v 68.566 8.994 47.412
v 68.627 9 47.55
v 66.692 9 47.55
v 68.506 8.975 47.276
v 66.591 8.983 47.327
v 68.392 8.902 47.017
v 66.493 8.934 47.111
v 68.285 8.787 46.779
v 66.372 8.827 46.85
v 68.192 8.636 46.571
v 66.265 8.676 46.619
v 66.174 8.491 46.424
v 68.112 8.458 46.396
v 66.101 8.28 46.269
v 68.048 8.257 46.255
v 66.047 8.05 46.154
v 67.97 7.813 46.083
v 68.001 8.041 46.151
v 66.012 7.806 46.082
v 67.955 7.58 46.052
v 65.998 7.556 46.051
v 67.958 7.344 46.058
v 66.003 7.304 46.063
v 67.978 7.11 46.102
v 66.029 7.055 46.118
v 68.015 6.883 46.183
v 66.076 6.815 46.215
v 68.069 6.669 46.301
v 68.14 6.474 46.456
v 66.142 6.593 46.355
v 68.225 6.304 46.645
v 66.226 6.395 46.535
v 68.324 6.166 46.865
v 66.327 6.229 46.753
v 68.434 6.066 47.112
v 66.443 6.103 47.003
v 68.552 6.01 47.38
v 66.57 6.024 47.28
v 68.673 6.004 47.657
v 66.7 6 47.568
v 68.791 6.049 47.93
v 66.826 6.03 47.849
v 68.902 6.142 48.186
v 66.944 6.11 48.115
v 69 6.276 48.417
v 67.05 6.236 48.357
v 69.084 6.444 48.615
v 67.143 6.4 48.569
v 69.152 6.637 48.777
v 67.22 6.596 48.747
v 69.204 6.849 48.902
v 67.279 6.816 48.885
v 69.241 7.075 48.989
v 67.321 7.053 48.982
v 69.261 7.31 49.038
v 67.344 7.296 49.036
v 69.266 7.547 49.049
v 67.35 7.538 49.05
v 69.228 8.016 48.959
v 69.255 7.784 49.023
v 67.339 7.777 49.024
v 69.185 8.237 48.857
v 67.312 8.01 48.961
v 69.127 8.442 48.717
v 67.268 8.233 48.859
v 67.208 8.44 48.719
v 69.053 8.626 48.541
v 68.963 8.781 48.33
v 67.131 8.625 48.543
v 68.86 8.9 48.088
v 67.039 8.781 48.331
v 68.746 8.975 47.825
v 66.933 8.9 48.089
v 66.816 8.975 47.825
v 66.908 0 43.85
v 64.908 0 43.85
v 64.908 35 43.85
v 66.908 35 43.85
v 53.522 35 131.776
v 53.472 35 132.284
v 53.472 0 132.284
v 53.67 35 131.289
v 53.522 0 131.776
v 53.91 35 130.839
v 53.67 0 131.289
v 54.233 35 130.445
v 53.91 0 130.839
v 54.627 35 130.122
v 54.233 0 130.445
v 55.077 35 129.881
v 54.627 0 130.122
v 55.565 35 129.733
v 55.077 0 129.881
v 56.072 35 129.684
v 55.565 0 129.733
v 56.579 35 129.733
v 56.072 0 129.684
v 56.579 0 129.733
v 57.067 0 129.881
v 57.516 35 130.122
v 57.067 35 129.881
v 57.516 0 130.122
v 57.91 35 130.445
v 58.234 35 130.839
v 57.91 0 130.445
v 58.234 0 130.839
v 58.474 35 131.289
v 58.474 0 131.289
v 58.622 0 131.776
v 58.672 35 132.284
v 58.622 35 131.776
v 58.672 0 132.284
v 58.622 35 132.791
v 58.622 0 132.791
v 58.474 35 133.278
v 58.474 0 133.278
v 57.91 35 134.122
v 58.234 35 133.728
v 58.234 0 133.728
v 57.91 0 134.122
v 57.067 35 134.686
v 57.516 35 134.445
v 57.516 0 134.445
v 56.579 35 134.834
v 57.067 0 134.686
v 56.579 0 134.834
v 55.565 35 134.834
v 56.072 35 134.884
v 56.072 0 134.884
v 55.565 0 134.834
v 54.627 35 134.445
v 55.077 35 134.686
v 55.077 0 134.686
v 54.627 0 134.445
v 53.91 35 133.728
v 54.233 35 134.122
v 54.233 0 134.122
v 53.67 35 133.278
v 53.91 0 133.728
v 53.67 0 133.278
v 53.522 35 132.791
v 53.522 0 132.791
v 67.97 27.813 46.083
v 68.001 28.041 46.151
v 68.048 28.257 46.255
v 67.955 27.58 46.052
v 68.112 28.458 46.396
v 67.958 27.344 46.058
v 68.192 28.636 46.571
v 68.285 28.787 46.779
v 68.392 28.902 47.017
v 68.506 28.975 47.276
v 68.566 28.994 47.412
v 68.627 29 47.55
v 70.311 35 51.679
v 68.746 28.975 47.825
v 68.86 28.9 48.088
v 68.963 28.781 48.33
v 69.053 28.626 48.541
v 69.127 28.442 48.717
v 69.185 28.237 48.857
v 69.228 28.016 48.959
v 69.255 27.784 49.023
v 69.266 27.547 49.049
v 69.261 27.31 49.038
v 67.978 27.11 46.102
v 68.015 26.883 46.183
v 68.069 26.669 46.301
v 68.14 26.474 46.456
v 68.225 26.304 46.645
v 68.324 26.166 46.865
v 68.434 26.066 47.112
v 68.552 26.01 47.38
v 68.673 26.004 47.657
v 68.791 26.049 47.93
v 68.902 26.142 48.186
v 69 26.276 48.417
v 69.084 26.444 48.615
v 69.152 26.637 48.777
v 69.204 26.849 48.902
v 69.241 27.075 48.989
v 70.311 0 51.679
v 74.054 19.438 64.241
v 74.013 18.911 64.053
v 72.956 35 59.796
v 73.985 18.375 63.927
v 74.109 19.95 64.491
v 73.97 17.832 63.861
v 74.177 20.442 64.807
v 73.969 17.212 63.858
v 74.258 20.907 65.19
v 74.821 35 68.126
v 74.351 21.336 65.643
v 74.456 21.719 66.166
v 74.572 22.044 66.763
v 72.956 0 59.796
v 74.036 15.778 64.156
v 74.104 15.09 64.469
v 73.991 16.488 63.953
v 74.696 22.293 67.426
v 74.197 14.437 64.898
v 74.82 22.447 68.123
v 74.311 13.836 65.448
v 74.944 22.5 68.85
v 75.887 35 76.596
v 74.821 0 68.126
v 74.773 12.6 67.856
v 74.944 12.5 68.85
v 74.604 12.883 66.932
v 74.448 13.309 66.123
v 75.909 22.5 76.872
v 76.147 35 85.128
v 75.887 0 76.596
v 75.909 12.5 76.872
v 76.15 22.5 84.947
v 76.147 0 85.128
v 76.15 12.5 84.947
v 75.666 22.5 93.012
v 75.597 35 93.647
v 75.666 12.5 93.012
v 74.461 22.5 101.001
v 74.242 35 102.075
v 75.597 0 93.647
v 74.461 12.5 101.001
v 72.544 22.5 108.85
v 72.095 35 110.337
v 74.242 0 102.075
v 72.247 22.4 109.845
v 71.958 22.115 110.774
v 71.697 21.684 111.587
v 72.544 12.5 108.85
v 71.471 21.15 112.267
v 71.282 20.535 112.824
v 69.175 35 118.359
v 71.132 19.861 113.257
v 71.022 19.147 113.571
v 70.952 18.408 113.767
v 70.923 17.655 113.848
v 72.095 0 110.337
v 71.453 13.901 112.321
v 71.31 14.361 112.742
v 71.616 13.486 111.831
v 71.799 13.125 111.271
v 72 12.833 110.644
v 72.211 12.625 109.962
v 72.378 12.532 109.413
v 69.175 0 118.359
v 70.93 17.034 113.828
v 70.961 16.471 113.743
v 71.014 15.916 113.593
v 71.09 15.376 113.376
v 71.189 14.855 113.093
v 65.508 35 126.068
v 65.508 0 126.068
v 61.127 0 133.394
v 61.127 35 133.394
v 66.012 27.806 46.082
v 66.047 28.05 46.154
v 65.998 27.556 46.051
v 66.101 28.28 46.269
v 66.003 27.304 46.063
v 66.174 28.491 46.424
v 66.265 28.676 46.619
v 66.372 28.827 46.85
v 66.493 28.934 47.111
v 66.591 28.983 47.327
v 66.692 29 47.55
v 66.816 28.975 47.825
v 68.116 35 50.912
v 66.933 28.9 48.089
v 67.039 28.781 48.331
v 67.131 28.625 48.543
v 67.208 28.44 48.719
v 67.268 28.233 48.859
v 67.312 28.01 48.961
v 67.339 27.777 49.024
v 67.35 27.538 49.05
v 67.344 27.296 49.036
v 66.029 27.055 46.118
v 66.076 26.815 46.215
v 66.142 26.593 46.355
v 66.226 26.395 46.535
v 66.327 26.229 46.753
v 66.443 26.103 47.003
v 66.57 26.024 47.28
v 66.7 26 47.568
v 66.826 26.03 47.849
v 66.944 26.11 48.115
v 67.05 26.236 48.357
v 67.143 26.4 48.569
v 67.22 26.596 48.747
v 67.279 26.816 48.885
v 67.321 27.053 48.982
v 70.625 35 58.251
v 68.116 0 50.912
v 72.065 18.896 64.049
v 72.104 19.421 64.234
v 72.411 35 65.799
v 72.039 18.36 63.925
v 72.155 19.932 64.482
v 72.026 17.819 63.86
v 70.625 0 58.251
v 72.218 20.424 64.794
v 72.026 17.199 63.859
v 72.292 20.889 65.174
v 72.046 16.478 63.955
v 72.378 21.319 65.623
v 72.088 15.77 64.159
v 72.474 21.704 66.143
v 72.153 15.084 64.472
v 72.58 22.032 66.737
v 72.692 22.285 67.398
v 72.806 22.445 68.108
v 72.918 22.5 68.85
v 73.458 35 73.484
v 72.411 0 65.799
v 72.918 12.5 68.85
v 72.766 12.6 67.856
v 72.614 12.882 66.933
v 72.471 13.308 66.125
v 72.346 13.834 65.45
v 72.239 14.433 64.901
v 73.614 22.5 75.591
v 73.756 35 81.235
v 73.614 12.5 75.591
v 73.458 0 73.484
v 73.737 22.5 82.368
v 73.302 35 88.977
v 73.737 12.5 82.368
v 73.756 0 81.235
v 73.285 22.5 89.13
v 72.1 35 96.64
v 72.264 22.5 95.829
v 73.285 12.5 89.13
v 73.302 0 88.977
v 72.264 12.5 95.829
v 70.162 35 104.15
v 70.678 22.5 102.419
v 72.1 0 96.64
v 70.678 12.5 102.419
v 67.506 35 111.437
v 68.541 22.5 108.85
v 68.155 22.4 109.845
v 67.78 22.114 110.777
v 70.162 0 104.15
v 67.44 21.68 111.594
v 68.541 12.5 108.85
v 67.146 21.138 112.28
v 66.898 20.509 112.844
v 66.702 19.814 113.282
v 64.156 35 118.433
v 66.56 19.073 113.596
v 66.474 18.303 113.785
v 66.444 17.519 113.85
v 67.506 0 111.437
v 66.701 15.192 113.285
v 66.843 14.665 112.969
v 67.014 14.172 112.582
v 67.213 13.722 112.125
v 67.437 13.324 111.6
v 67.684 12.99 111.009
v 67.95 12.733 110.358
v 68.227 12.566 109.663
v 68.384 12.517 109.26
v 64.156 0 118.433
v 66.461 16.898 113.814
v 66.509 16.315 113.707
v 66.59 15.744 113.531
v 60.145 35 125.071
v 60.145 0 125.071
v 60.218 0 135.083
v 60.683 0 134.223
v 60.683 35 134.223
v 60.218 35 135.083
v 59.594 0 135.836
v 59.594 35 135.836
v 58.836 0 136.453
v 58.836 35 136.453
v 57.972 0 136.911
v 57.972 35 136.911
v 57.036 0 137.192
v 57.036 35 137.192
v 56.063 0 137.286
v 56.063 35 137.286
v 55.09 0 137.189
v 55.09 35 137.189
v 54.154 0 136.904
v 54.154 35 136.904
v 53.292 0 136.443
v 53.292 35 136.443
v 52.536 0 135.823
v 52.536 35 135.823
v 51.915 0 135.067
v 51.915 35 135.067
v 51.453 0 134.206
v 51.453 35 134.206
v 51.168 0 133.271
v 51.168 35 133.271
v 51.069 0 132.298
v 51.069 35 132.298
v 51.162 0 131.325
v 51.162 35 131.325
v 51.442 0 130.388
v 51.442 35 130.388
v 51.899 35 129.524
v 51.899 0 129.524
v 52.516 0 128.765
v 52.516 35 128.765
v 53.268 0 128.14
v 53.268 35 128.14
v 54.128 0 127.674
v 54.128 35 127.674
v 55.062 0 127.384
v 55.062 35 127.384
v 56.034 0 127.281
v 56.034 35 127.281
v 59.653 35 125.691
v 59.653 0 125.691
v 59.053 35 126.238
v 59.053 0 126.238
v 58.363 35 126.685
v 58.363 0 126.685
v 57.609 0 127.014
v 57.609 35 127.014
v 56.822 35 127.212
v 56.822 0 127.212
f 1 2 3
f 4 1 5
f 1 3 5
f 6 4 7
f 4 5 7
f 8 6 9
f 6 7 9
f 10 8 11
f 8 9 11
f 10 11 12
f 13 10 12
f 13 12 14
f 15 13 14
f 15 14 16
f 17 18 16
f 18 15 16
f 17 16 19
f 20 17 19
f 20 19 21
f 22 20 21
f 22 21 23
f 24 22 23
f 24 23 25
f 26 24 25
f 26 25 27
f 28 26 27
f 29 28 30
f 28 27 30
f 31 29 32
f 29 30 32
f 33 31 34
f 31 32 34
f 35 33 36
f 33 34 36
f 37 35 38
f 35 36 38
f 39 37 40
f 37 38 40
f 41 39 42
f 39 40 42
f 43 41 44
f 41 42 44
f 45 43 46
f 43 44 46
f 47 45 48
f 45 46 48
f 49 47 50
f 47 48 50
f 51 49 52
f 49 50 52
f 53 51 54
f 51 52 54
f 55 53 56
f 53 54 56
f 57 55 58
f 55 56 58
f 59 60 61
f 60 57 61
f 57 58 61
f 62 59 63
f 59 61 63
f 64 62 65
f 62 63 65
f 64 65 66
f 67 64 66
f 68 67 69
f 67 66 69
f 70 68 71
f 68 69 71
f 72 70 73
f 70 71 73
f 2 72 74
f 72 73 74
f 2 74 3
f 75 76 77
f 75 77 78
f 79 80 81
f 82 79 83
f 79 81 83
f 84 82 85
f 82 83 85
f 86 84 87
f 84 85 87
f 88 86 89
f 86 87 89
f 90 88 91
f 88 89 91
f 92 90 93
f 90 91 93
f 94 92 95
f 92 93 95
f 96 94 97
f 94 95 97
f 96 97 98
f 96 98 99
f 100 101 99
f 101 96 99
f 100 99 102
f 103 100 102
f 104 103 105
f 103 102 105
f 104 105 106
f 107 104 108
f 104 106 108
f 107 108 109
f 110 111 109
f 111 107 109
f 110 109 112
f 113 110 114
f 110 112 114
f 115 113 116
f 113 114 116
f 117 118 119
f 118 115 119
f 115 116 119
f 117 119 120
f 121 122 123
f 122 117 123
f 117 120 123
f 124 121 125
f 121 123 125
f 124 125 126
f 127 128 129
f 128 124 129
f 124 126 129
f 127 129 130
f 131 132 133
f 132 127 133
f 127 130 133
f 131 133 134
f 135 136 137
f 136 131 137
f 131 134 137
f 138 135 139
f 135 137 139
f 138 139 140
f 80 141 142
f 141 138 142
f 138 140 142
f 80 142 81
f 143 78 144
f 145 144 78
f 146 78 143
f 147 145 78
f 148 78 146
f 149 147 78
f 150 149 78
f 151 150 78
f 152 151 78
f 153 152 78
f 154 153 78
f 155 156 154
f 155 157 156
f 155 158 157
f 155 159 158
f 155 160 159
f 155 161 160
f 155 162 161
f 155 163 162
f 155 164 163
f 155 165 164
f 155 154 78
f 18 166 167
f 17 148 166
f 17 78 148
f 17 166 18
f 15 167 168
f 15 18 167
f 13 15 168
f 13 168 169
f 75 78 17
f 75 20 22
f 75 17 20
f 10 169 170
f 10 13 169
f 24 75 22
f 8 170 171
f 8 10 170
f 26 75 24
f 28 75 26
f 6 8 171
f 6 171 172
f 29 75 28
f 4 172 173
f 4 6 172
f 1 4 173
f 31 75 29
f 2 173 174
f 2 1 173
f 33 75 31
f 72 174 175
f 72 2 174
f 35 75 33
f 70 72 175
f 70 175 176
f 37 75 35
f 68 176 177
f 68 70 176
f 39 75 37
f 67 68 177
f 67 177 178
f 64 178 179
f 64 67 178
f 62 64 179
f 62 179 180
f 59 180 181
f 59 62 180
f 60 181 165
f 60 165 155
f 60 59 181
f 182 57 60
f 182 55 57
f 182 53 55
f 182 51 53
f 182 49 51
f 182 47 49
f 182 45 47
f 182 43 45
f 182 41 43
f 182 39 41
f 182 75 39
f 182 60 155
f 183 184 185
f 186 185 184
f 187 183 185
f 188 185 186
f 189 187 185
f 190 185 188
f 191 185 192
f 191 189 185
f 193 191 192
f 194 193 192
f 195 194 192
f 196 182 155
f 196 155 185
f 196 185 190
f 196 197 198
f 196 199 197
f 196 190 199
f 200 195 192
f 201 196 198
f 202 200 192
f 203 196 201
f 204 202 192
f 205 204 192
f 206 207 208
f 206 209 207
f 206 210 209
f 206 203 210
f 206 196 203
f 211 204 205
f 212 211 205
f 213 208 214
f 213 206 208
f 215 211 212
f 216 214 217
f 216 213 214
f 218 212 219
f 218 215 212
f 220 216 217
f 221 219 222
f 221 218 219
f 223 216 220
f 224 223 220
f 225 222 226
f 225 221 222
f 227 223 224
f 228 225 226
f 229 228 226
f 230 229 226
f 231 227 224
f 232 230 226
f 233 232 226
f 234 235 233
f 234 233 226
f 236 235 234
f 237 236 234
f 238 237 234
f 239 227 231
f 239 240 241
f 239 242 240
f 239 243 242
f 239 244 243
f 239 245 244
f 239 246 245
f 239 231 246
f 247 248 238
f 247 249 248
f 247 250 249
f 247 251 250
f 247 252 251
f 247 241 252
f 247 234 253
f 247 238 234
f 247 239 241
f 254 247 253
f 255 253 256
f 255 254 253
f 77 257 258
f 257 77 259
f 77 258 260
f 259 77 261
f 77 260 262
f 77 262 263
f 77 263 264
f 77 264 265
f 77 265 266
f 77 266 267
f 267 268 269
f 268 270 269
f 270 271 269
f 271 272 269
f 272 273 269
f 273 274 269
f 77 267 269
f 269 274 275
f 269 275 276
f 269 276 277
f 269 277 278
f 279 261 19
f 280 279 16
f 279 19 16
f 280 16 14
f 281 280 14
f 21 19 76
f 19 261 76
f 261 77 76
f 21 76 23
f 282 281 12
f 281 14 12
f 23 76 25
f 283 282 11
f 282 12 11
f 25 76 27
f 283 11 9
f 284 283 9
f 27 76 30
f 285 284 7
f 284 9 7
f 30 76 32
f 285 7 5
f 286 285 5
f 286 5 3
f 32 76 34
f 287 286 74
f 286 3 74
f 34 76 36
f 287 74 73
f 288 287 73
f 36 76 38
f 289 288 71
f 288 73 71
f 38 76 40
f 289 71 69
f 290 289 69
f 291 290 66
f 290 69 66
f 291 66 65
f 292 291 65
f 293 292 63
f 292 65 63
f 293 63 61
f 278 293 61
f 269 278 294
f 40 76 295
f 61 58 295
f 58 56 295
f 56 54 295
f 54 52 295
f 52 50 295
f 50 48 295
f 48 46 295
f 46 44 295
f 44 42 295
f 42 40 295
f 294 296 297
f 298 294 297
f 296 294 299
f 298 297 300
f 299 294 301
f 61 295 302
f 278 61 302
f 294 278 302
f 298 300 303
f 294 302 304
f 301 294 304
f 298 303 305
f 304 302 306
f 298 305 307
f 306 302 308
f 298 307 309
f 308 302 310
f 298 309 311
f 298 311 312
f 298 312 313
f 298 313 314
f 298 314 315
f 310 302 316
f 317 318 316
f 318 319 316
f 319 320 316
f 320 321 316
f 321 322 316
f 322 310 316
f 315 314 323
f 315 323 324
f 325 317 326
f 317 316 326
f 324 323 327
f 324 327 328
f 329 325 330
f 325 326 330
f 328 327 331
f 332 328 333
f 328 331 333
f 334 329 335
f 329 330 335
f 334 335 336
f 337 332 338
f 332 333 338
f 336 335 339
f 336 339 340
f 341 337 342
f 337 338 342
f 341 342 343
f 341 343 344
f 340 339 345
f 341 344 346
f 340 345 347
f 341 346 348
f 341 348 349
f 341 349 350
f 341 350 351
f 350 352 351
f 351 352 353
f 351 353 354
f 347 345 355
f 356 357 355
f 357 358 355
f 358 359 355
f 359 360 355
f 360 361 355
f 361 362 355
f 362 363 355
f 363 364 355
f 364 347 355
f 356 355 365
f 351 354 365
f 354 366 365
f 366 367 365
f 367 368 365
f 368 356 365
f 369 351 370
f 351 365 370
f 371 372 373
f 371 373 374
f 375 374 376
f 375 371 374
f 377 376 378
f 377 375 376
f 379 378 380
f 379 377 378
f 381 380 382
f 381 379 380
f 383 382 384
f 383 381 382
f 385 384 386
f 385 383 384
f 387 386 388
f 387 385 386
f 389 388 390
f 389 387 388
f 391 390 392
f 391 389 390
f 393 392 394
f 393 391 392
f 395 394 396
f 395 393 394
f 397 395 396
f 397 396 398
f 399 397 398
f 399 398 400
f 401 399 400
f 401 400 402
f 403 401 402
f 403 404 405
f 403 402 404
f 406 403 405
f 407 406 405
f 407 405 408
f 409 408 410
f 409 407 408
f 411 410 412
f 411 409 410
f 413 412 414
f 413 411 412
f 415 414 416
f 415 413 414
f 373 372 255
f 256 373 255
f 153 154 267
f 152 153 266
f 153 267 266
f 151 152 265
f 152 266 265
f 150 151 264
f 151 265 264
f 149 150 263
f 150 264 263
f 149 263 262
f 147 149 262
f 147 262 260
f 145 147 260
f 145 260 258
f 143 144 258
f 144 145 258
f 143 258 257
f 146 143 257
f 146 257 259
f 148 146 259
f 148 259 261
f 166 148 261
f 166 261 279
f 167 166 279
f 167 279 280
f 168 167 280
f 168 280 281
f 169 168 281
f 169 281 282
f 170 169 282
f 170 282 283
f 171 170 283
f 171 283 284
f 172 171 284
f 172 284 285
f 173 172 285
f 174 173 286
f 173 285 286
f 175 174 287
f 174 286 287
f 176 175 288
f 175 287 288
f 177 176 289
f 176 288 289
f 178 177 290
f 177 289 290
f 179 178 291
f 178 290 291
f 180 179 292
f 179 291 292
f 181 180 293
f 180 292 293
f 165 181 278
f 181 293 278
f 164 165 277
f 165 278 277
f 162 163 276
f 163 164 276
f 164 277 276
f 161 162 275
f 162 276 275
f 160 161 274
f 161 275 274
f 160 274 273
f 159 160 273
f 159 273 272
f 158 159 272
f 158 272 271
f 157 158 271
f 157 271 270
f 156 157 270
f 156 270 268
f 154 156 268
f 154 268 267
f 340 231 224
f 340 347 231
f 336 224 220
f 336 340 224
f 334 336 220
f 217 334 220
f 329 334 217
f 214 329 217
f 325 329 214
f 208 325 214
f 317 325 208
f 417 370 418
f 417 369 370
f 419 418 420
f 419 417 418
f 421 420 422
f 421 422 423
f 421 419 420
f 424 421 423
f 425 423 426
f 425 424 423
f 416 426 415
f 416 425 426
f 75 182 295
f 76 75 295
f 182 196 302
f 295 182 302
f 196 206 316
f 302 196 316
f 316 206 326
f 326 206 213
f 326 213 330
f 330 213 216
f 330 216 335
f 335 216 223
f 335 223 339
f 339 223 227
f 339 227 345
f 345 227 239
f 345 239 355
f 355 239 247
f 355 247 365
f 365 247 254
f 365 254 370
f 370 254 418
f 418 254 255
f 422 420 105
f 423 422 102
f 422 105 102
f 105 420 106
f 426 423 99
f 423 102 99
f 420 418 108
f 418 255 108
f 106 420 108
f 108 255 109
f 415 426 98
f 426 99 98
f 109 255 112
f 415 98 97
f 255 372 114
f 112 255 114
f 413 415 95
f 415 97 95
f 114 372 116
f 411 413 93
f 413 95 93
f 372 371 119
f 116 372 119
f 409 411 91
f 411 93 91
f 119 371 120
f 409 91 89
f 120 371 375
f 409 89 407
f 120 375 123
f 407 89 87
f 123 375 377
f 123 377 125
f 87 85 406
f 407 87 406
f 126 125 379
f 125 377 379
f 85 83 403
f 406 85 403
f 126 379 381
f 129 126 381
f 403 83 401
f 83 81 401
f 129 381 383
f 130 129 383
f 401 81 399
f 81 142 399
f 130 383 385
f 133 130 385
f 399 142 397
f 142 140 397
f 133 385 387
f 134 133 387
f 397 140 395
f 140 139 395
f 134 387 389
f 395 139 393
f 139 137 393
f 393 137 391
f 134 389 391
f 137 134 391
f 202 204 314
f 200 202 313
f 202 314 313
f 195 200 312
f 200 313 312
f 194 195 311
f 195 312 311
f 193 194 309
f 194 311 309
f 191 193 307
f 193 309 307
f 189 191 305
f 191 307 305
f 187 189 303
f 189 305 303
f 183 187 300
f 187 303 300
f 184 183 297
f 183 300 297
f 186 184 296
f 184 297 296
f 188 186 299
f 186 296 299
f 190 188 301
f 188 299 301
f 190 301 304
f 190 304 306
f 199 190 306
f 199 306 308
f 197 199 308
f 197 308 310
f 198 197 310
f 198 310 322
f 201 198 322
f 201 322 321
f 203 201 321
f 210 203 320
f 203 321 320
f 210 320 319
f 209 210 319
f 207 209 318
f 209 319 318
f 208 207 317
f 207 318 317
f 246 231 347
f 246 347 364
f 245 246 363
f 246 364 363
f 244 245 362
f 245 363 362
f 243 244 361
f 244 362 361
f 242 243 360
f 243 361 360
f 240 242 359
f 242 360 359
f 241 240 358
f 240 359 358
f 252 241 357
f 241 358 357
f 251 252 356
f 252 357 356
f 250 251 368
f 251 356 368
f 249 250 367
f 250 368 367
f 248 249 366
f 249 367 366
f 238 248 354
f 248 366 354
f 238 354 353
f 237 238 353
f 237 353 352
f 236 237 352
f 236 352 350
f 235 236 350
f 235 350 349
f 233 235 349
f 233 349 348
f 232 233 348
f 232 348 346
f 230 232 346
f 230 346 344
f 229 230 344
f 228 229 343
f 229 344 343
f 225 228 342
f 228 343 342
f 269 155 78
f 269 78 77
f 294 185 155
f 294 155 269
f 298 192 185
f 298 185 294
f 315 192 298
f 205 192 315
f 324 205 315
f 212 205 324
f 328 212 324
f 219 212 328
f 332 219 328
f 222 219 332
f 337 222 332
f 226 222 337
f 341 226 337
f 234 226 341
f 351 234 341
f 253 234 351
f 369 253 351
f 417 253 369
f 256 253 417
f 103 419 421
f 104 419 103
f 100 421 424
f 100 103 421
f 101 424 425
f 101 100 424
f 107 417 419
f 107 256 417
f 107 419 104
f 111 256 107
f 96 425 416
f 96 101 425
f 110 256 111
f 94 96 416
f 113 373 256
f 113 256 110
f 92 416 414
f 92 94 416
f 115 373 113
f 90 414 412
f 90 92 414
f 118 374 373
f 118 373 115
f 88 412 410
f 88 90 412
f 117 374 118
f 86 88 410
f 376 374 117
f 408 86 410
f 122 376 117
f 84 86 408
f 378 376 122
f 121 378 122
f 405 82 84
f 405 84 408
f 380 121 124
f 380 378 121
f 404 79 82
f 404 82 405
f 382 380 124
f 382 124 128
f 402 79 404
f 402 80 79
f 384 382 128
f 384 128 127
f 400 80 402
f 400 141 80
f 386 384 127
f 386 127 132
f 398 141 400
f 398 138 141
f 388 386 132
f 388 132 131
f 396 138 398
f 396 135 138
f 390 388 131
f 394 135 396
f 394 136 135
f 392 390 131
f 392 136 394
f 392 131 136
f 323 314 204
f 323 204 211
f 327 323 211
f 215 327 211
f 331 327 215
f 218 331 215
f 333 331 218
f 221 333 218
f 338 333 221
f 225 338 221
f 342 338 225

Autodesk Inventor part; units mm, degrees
ref_plane "YZ Plane" through (0, 0, 0) normal (1, 0, 0) x (0, 1, 0)
ref_plane "XZ Plane" through (0, 0, 0) normal (0, 1, 0) x (-1, 0, 0)
ref_plane "XY Plane" through (0, 0, 0) normal (0, 0, 1) x (1, 0, 0)
sketch "Эскиз1" plane through (0, 0, 0) normal (0, 1, 0) x (-1, 0, 0)
  circle A0 centre (-56.0718, 132.2835) radius 2.6
  line L0 (-64.9084, 43.85) -> (-66.9084, 43.85)
  circle A1 centre (-56.0718, 132.2835) radius 5.0026
  arc A2 (-60.8228, 133.85) -> (-66.9084, 43.85) centre (13.8399, 83.5958) ccw
  arc A3 (-58.2432, 127.7768) -> (-64.9084, 43.85) centre (6.2398, 80.4278) ccw
  line L1 (-60.8228, 133.85) -> (-51.3208, 133.85)
  point P0 (-68.2724, 116.2724)
  dimension "d27" = 5.2
  dimension "d28" = 2
  dimension "d29" = 90
  dimension "d30" = 80
  dimension "d35" = 90
  dimension "d47" = 10.0052
  dimension "d48" = 1.5665
extrude "Выдавливание1" add sketch "Эскиз1" along normal blind 35 contours A0 L1 A1 | A0 L1 A1 | A1 A3 L0 A2
sketch "Эскиз2" plane through (0, 0, 0) normal (1, 0, 0) x (0, 1, 0)
  circle A0 centre (27.5, 47.55) radius 1.5
  circle A1 centre (7.5, 47.55) radius 1.5
  line L0 (0, 43.85) -> (35, 43.85) projected
  line L1 (35, 127.7768) -> (35, 43.85) projected
  line L2 (17.5, 68.85) -> (17.5, 108.85) construction
  line L3 (22.5, 68.85) -> (22.5, 108.85)
  line L4 (12.5, 108.85) -> (12.5, 68.85)
  arc A2 (12.5, 68.85) -> (22.5, 68.85) centre (17.5, 68.85) ccw
  arc A3 (22.5, 108.85) -> (12.5, 108.85) centre (17.5, 108.85) ccw
  point P0 (0, 0)
  point P1 (17.5, 88.85)
  point P2 (17.5, 63.85)
  dimension "d36" = 3
  dimension "d37" = 3
  dimension "d38" = 3.7
  dimension "d39" = 3.7
  dimension "d40" = 7.5
  dimension "d41" = 20
  dimension "d44" = 40
  dimension "d45" = 10
  dimension "d46" = 20
extrude "Выдавливание2" cut sketch "Эскиз2" along normal blind 94.5
fillet "Сопряжение3" radius 5 1 edges at (58.2432, 17.5, 127.7768)
fillet "Сопряжение4" radius 5 1 edges at (60.8228, 17.5, 133.85)
properties part number "protect_2"
